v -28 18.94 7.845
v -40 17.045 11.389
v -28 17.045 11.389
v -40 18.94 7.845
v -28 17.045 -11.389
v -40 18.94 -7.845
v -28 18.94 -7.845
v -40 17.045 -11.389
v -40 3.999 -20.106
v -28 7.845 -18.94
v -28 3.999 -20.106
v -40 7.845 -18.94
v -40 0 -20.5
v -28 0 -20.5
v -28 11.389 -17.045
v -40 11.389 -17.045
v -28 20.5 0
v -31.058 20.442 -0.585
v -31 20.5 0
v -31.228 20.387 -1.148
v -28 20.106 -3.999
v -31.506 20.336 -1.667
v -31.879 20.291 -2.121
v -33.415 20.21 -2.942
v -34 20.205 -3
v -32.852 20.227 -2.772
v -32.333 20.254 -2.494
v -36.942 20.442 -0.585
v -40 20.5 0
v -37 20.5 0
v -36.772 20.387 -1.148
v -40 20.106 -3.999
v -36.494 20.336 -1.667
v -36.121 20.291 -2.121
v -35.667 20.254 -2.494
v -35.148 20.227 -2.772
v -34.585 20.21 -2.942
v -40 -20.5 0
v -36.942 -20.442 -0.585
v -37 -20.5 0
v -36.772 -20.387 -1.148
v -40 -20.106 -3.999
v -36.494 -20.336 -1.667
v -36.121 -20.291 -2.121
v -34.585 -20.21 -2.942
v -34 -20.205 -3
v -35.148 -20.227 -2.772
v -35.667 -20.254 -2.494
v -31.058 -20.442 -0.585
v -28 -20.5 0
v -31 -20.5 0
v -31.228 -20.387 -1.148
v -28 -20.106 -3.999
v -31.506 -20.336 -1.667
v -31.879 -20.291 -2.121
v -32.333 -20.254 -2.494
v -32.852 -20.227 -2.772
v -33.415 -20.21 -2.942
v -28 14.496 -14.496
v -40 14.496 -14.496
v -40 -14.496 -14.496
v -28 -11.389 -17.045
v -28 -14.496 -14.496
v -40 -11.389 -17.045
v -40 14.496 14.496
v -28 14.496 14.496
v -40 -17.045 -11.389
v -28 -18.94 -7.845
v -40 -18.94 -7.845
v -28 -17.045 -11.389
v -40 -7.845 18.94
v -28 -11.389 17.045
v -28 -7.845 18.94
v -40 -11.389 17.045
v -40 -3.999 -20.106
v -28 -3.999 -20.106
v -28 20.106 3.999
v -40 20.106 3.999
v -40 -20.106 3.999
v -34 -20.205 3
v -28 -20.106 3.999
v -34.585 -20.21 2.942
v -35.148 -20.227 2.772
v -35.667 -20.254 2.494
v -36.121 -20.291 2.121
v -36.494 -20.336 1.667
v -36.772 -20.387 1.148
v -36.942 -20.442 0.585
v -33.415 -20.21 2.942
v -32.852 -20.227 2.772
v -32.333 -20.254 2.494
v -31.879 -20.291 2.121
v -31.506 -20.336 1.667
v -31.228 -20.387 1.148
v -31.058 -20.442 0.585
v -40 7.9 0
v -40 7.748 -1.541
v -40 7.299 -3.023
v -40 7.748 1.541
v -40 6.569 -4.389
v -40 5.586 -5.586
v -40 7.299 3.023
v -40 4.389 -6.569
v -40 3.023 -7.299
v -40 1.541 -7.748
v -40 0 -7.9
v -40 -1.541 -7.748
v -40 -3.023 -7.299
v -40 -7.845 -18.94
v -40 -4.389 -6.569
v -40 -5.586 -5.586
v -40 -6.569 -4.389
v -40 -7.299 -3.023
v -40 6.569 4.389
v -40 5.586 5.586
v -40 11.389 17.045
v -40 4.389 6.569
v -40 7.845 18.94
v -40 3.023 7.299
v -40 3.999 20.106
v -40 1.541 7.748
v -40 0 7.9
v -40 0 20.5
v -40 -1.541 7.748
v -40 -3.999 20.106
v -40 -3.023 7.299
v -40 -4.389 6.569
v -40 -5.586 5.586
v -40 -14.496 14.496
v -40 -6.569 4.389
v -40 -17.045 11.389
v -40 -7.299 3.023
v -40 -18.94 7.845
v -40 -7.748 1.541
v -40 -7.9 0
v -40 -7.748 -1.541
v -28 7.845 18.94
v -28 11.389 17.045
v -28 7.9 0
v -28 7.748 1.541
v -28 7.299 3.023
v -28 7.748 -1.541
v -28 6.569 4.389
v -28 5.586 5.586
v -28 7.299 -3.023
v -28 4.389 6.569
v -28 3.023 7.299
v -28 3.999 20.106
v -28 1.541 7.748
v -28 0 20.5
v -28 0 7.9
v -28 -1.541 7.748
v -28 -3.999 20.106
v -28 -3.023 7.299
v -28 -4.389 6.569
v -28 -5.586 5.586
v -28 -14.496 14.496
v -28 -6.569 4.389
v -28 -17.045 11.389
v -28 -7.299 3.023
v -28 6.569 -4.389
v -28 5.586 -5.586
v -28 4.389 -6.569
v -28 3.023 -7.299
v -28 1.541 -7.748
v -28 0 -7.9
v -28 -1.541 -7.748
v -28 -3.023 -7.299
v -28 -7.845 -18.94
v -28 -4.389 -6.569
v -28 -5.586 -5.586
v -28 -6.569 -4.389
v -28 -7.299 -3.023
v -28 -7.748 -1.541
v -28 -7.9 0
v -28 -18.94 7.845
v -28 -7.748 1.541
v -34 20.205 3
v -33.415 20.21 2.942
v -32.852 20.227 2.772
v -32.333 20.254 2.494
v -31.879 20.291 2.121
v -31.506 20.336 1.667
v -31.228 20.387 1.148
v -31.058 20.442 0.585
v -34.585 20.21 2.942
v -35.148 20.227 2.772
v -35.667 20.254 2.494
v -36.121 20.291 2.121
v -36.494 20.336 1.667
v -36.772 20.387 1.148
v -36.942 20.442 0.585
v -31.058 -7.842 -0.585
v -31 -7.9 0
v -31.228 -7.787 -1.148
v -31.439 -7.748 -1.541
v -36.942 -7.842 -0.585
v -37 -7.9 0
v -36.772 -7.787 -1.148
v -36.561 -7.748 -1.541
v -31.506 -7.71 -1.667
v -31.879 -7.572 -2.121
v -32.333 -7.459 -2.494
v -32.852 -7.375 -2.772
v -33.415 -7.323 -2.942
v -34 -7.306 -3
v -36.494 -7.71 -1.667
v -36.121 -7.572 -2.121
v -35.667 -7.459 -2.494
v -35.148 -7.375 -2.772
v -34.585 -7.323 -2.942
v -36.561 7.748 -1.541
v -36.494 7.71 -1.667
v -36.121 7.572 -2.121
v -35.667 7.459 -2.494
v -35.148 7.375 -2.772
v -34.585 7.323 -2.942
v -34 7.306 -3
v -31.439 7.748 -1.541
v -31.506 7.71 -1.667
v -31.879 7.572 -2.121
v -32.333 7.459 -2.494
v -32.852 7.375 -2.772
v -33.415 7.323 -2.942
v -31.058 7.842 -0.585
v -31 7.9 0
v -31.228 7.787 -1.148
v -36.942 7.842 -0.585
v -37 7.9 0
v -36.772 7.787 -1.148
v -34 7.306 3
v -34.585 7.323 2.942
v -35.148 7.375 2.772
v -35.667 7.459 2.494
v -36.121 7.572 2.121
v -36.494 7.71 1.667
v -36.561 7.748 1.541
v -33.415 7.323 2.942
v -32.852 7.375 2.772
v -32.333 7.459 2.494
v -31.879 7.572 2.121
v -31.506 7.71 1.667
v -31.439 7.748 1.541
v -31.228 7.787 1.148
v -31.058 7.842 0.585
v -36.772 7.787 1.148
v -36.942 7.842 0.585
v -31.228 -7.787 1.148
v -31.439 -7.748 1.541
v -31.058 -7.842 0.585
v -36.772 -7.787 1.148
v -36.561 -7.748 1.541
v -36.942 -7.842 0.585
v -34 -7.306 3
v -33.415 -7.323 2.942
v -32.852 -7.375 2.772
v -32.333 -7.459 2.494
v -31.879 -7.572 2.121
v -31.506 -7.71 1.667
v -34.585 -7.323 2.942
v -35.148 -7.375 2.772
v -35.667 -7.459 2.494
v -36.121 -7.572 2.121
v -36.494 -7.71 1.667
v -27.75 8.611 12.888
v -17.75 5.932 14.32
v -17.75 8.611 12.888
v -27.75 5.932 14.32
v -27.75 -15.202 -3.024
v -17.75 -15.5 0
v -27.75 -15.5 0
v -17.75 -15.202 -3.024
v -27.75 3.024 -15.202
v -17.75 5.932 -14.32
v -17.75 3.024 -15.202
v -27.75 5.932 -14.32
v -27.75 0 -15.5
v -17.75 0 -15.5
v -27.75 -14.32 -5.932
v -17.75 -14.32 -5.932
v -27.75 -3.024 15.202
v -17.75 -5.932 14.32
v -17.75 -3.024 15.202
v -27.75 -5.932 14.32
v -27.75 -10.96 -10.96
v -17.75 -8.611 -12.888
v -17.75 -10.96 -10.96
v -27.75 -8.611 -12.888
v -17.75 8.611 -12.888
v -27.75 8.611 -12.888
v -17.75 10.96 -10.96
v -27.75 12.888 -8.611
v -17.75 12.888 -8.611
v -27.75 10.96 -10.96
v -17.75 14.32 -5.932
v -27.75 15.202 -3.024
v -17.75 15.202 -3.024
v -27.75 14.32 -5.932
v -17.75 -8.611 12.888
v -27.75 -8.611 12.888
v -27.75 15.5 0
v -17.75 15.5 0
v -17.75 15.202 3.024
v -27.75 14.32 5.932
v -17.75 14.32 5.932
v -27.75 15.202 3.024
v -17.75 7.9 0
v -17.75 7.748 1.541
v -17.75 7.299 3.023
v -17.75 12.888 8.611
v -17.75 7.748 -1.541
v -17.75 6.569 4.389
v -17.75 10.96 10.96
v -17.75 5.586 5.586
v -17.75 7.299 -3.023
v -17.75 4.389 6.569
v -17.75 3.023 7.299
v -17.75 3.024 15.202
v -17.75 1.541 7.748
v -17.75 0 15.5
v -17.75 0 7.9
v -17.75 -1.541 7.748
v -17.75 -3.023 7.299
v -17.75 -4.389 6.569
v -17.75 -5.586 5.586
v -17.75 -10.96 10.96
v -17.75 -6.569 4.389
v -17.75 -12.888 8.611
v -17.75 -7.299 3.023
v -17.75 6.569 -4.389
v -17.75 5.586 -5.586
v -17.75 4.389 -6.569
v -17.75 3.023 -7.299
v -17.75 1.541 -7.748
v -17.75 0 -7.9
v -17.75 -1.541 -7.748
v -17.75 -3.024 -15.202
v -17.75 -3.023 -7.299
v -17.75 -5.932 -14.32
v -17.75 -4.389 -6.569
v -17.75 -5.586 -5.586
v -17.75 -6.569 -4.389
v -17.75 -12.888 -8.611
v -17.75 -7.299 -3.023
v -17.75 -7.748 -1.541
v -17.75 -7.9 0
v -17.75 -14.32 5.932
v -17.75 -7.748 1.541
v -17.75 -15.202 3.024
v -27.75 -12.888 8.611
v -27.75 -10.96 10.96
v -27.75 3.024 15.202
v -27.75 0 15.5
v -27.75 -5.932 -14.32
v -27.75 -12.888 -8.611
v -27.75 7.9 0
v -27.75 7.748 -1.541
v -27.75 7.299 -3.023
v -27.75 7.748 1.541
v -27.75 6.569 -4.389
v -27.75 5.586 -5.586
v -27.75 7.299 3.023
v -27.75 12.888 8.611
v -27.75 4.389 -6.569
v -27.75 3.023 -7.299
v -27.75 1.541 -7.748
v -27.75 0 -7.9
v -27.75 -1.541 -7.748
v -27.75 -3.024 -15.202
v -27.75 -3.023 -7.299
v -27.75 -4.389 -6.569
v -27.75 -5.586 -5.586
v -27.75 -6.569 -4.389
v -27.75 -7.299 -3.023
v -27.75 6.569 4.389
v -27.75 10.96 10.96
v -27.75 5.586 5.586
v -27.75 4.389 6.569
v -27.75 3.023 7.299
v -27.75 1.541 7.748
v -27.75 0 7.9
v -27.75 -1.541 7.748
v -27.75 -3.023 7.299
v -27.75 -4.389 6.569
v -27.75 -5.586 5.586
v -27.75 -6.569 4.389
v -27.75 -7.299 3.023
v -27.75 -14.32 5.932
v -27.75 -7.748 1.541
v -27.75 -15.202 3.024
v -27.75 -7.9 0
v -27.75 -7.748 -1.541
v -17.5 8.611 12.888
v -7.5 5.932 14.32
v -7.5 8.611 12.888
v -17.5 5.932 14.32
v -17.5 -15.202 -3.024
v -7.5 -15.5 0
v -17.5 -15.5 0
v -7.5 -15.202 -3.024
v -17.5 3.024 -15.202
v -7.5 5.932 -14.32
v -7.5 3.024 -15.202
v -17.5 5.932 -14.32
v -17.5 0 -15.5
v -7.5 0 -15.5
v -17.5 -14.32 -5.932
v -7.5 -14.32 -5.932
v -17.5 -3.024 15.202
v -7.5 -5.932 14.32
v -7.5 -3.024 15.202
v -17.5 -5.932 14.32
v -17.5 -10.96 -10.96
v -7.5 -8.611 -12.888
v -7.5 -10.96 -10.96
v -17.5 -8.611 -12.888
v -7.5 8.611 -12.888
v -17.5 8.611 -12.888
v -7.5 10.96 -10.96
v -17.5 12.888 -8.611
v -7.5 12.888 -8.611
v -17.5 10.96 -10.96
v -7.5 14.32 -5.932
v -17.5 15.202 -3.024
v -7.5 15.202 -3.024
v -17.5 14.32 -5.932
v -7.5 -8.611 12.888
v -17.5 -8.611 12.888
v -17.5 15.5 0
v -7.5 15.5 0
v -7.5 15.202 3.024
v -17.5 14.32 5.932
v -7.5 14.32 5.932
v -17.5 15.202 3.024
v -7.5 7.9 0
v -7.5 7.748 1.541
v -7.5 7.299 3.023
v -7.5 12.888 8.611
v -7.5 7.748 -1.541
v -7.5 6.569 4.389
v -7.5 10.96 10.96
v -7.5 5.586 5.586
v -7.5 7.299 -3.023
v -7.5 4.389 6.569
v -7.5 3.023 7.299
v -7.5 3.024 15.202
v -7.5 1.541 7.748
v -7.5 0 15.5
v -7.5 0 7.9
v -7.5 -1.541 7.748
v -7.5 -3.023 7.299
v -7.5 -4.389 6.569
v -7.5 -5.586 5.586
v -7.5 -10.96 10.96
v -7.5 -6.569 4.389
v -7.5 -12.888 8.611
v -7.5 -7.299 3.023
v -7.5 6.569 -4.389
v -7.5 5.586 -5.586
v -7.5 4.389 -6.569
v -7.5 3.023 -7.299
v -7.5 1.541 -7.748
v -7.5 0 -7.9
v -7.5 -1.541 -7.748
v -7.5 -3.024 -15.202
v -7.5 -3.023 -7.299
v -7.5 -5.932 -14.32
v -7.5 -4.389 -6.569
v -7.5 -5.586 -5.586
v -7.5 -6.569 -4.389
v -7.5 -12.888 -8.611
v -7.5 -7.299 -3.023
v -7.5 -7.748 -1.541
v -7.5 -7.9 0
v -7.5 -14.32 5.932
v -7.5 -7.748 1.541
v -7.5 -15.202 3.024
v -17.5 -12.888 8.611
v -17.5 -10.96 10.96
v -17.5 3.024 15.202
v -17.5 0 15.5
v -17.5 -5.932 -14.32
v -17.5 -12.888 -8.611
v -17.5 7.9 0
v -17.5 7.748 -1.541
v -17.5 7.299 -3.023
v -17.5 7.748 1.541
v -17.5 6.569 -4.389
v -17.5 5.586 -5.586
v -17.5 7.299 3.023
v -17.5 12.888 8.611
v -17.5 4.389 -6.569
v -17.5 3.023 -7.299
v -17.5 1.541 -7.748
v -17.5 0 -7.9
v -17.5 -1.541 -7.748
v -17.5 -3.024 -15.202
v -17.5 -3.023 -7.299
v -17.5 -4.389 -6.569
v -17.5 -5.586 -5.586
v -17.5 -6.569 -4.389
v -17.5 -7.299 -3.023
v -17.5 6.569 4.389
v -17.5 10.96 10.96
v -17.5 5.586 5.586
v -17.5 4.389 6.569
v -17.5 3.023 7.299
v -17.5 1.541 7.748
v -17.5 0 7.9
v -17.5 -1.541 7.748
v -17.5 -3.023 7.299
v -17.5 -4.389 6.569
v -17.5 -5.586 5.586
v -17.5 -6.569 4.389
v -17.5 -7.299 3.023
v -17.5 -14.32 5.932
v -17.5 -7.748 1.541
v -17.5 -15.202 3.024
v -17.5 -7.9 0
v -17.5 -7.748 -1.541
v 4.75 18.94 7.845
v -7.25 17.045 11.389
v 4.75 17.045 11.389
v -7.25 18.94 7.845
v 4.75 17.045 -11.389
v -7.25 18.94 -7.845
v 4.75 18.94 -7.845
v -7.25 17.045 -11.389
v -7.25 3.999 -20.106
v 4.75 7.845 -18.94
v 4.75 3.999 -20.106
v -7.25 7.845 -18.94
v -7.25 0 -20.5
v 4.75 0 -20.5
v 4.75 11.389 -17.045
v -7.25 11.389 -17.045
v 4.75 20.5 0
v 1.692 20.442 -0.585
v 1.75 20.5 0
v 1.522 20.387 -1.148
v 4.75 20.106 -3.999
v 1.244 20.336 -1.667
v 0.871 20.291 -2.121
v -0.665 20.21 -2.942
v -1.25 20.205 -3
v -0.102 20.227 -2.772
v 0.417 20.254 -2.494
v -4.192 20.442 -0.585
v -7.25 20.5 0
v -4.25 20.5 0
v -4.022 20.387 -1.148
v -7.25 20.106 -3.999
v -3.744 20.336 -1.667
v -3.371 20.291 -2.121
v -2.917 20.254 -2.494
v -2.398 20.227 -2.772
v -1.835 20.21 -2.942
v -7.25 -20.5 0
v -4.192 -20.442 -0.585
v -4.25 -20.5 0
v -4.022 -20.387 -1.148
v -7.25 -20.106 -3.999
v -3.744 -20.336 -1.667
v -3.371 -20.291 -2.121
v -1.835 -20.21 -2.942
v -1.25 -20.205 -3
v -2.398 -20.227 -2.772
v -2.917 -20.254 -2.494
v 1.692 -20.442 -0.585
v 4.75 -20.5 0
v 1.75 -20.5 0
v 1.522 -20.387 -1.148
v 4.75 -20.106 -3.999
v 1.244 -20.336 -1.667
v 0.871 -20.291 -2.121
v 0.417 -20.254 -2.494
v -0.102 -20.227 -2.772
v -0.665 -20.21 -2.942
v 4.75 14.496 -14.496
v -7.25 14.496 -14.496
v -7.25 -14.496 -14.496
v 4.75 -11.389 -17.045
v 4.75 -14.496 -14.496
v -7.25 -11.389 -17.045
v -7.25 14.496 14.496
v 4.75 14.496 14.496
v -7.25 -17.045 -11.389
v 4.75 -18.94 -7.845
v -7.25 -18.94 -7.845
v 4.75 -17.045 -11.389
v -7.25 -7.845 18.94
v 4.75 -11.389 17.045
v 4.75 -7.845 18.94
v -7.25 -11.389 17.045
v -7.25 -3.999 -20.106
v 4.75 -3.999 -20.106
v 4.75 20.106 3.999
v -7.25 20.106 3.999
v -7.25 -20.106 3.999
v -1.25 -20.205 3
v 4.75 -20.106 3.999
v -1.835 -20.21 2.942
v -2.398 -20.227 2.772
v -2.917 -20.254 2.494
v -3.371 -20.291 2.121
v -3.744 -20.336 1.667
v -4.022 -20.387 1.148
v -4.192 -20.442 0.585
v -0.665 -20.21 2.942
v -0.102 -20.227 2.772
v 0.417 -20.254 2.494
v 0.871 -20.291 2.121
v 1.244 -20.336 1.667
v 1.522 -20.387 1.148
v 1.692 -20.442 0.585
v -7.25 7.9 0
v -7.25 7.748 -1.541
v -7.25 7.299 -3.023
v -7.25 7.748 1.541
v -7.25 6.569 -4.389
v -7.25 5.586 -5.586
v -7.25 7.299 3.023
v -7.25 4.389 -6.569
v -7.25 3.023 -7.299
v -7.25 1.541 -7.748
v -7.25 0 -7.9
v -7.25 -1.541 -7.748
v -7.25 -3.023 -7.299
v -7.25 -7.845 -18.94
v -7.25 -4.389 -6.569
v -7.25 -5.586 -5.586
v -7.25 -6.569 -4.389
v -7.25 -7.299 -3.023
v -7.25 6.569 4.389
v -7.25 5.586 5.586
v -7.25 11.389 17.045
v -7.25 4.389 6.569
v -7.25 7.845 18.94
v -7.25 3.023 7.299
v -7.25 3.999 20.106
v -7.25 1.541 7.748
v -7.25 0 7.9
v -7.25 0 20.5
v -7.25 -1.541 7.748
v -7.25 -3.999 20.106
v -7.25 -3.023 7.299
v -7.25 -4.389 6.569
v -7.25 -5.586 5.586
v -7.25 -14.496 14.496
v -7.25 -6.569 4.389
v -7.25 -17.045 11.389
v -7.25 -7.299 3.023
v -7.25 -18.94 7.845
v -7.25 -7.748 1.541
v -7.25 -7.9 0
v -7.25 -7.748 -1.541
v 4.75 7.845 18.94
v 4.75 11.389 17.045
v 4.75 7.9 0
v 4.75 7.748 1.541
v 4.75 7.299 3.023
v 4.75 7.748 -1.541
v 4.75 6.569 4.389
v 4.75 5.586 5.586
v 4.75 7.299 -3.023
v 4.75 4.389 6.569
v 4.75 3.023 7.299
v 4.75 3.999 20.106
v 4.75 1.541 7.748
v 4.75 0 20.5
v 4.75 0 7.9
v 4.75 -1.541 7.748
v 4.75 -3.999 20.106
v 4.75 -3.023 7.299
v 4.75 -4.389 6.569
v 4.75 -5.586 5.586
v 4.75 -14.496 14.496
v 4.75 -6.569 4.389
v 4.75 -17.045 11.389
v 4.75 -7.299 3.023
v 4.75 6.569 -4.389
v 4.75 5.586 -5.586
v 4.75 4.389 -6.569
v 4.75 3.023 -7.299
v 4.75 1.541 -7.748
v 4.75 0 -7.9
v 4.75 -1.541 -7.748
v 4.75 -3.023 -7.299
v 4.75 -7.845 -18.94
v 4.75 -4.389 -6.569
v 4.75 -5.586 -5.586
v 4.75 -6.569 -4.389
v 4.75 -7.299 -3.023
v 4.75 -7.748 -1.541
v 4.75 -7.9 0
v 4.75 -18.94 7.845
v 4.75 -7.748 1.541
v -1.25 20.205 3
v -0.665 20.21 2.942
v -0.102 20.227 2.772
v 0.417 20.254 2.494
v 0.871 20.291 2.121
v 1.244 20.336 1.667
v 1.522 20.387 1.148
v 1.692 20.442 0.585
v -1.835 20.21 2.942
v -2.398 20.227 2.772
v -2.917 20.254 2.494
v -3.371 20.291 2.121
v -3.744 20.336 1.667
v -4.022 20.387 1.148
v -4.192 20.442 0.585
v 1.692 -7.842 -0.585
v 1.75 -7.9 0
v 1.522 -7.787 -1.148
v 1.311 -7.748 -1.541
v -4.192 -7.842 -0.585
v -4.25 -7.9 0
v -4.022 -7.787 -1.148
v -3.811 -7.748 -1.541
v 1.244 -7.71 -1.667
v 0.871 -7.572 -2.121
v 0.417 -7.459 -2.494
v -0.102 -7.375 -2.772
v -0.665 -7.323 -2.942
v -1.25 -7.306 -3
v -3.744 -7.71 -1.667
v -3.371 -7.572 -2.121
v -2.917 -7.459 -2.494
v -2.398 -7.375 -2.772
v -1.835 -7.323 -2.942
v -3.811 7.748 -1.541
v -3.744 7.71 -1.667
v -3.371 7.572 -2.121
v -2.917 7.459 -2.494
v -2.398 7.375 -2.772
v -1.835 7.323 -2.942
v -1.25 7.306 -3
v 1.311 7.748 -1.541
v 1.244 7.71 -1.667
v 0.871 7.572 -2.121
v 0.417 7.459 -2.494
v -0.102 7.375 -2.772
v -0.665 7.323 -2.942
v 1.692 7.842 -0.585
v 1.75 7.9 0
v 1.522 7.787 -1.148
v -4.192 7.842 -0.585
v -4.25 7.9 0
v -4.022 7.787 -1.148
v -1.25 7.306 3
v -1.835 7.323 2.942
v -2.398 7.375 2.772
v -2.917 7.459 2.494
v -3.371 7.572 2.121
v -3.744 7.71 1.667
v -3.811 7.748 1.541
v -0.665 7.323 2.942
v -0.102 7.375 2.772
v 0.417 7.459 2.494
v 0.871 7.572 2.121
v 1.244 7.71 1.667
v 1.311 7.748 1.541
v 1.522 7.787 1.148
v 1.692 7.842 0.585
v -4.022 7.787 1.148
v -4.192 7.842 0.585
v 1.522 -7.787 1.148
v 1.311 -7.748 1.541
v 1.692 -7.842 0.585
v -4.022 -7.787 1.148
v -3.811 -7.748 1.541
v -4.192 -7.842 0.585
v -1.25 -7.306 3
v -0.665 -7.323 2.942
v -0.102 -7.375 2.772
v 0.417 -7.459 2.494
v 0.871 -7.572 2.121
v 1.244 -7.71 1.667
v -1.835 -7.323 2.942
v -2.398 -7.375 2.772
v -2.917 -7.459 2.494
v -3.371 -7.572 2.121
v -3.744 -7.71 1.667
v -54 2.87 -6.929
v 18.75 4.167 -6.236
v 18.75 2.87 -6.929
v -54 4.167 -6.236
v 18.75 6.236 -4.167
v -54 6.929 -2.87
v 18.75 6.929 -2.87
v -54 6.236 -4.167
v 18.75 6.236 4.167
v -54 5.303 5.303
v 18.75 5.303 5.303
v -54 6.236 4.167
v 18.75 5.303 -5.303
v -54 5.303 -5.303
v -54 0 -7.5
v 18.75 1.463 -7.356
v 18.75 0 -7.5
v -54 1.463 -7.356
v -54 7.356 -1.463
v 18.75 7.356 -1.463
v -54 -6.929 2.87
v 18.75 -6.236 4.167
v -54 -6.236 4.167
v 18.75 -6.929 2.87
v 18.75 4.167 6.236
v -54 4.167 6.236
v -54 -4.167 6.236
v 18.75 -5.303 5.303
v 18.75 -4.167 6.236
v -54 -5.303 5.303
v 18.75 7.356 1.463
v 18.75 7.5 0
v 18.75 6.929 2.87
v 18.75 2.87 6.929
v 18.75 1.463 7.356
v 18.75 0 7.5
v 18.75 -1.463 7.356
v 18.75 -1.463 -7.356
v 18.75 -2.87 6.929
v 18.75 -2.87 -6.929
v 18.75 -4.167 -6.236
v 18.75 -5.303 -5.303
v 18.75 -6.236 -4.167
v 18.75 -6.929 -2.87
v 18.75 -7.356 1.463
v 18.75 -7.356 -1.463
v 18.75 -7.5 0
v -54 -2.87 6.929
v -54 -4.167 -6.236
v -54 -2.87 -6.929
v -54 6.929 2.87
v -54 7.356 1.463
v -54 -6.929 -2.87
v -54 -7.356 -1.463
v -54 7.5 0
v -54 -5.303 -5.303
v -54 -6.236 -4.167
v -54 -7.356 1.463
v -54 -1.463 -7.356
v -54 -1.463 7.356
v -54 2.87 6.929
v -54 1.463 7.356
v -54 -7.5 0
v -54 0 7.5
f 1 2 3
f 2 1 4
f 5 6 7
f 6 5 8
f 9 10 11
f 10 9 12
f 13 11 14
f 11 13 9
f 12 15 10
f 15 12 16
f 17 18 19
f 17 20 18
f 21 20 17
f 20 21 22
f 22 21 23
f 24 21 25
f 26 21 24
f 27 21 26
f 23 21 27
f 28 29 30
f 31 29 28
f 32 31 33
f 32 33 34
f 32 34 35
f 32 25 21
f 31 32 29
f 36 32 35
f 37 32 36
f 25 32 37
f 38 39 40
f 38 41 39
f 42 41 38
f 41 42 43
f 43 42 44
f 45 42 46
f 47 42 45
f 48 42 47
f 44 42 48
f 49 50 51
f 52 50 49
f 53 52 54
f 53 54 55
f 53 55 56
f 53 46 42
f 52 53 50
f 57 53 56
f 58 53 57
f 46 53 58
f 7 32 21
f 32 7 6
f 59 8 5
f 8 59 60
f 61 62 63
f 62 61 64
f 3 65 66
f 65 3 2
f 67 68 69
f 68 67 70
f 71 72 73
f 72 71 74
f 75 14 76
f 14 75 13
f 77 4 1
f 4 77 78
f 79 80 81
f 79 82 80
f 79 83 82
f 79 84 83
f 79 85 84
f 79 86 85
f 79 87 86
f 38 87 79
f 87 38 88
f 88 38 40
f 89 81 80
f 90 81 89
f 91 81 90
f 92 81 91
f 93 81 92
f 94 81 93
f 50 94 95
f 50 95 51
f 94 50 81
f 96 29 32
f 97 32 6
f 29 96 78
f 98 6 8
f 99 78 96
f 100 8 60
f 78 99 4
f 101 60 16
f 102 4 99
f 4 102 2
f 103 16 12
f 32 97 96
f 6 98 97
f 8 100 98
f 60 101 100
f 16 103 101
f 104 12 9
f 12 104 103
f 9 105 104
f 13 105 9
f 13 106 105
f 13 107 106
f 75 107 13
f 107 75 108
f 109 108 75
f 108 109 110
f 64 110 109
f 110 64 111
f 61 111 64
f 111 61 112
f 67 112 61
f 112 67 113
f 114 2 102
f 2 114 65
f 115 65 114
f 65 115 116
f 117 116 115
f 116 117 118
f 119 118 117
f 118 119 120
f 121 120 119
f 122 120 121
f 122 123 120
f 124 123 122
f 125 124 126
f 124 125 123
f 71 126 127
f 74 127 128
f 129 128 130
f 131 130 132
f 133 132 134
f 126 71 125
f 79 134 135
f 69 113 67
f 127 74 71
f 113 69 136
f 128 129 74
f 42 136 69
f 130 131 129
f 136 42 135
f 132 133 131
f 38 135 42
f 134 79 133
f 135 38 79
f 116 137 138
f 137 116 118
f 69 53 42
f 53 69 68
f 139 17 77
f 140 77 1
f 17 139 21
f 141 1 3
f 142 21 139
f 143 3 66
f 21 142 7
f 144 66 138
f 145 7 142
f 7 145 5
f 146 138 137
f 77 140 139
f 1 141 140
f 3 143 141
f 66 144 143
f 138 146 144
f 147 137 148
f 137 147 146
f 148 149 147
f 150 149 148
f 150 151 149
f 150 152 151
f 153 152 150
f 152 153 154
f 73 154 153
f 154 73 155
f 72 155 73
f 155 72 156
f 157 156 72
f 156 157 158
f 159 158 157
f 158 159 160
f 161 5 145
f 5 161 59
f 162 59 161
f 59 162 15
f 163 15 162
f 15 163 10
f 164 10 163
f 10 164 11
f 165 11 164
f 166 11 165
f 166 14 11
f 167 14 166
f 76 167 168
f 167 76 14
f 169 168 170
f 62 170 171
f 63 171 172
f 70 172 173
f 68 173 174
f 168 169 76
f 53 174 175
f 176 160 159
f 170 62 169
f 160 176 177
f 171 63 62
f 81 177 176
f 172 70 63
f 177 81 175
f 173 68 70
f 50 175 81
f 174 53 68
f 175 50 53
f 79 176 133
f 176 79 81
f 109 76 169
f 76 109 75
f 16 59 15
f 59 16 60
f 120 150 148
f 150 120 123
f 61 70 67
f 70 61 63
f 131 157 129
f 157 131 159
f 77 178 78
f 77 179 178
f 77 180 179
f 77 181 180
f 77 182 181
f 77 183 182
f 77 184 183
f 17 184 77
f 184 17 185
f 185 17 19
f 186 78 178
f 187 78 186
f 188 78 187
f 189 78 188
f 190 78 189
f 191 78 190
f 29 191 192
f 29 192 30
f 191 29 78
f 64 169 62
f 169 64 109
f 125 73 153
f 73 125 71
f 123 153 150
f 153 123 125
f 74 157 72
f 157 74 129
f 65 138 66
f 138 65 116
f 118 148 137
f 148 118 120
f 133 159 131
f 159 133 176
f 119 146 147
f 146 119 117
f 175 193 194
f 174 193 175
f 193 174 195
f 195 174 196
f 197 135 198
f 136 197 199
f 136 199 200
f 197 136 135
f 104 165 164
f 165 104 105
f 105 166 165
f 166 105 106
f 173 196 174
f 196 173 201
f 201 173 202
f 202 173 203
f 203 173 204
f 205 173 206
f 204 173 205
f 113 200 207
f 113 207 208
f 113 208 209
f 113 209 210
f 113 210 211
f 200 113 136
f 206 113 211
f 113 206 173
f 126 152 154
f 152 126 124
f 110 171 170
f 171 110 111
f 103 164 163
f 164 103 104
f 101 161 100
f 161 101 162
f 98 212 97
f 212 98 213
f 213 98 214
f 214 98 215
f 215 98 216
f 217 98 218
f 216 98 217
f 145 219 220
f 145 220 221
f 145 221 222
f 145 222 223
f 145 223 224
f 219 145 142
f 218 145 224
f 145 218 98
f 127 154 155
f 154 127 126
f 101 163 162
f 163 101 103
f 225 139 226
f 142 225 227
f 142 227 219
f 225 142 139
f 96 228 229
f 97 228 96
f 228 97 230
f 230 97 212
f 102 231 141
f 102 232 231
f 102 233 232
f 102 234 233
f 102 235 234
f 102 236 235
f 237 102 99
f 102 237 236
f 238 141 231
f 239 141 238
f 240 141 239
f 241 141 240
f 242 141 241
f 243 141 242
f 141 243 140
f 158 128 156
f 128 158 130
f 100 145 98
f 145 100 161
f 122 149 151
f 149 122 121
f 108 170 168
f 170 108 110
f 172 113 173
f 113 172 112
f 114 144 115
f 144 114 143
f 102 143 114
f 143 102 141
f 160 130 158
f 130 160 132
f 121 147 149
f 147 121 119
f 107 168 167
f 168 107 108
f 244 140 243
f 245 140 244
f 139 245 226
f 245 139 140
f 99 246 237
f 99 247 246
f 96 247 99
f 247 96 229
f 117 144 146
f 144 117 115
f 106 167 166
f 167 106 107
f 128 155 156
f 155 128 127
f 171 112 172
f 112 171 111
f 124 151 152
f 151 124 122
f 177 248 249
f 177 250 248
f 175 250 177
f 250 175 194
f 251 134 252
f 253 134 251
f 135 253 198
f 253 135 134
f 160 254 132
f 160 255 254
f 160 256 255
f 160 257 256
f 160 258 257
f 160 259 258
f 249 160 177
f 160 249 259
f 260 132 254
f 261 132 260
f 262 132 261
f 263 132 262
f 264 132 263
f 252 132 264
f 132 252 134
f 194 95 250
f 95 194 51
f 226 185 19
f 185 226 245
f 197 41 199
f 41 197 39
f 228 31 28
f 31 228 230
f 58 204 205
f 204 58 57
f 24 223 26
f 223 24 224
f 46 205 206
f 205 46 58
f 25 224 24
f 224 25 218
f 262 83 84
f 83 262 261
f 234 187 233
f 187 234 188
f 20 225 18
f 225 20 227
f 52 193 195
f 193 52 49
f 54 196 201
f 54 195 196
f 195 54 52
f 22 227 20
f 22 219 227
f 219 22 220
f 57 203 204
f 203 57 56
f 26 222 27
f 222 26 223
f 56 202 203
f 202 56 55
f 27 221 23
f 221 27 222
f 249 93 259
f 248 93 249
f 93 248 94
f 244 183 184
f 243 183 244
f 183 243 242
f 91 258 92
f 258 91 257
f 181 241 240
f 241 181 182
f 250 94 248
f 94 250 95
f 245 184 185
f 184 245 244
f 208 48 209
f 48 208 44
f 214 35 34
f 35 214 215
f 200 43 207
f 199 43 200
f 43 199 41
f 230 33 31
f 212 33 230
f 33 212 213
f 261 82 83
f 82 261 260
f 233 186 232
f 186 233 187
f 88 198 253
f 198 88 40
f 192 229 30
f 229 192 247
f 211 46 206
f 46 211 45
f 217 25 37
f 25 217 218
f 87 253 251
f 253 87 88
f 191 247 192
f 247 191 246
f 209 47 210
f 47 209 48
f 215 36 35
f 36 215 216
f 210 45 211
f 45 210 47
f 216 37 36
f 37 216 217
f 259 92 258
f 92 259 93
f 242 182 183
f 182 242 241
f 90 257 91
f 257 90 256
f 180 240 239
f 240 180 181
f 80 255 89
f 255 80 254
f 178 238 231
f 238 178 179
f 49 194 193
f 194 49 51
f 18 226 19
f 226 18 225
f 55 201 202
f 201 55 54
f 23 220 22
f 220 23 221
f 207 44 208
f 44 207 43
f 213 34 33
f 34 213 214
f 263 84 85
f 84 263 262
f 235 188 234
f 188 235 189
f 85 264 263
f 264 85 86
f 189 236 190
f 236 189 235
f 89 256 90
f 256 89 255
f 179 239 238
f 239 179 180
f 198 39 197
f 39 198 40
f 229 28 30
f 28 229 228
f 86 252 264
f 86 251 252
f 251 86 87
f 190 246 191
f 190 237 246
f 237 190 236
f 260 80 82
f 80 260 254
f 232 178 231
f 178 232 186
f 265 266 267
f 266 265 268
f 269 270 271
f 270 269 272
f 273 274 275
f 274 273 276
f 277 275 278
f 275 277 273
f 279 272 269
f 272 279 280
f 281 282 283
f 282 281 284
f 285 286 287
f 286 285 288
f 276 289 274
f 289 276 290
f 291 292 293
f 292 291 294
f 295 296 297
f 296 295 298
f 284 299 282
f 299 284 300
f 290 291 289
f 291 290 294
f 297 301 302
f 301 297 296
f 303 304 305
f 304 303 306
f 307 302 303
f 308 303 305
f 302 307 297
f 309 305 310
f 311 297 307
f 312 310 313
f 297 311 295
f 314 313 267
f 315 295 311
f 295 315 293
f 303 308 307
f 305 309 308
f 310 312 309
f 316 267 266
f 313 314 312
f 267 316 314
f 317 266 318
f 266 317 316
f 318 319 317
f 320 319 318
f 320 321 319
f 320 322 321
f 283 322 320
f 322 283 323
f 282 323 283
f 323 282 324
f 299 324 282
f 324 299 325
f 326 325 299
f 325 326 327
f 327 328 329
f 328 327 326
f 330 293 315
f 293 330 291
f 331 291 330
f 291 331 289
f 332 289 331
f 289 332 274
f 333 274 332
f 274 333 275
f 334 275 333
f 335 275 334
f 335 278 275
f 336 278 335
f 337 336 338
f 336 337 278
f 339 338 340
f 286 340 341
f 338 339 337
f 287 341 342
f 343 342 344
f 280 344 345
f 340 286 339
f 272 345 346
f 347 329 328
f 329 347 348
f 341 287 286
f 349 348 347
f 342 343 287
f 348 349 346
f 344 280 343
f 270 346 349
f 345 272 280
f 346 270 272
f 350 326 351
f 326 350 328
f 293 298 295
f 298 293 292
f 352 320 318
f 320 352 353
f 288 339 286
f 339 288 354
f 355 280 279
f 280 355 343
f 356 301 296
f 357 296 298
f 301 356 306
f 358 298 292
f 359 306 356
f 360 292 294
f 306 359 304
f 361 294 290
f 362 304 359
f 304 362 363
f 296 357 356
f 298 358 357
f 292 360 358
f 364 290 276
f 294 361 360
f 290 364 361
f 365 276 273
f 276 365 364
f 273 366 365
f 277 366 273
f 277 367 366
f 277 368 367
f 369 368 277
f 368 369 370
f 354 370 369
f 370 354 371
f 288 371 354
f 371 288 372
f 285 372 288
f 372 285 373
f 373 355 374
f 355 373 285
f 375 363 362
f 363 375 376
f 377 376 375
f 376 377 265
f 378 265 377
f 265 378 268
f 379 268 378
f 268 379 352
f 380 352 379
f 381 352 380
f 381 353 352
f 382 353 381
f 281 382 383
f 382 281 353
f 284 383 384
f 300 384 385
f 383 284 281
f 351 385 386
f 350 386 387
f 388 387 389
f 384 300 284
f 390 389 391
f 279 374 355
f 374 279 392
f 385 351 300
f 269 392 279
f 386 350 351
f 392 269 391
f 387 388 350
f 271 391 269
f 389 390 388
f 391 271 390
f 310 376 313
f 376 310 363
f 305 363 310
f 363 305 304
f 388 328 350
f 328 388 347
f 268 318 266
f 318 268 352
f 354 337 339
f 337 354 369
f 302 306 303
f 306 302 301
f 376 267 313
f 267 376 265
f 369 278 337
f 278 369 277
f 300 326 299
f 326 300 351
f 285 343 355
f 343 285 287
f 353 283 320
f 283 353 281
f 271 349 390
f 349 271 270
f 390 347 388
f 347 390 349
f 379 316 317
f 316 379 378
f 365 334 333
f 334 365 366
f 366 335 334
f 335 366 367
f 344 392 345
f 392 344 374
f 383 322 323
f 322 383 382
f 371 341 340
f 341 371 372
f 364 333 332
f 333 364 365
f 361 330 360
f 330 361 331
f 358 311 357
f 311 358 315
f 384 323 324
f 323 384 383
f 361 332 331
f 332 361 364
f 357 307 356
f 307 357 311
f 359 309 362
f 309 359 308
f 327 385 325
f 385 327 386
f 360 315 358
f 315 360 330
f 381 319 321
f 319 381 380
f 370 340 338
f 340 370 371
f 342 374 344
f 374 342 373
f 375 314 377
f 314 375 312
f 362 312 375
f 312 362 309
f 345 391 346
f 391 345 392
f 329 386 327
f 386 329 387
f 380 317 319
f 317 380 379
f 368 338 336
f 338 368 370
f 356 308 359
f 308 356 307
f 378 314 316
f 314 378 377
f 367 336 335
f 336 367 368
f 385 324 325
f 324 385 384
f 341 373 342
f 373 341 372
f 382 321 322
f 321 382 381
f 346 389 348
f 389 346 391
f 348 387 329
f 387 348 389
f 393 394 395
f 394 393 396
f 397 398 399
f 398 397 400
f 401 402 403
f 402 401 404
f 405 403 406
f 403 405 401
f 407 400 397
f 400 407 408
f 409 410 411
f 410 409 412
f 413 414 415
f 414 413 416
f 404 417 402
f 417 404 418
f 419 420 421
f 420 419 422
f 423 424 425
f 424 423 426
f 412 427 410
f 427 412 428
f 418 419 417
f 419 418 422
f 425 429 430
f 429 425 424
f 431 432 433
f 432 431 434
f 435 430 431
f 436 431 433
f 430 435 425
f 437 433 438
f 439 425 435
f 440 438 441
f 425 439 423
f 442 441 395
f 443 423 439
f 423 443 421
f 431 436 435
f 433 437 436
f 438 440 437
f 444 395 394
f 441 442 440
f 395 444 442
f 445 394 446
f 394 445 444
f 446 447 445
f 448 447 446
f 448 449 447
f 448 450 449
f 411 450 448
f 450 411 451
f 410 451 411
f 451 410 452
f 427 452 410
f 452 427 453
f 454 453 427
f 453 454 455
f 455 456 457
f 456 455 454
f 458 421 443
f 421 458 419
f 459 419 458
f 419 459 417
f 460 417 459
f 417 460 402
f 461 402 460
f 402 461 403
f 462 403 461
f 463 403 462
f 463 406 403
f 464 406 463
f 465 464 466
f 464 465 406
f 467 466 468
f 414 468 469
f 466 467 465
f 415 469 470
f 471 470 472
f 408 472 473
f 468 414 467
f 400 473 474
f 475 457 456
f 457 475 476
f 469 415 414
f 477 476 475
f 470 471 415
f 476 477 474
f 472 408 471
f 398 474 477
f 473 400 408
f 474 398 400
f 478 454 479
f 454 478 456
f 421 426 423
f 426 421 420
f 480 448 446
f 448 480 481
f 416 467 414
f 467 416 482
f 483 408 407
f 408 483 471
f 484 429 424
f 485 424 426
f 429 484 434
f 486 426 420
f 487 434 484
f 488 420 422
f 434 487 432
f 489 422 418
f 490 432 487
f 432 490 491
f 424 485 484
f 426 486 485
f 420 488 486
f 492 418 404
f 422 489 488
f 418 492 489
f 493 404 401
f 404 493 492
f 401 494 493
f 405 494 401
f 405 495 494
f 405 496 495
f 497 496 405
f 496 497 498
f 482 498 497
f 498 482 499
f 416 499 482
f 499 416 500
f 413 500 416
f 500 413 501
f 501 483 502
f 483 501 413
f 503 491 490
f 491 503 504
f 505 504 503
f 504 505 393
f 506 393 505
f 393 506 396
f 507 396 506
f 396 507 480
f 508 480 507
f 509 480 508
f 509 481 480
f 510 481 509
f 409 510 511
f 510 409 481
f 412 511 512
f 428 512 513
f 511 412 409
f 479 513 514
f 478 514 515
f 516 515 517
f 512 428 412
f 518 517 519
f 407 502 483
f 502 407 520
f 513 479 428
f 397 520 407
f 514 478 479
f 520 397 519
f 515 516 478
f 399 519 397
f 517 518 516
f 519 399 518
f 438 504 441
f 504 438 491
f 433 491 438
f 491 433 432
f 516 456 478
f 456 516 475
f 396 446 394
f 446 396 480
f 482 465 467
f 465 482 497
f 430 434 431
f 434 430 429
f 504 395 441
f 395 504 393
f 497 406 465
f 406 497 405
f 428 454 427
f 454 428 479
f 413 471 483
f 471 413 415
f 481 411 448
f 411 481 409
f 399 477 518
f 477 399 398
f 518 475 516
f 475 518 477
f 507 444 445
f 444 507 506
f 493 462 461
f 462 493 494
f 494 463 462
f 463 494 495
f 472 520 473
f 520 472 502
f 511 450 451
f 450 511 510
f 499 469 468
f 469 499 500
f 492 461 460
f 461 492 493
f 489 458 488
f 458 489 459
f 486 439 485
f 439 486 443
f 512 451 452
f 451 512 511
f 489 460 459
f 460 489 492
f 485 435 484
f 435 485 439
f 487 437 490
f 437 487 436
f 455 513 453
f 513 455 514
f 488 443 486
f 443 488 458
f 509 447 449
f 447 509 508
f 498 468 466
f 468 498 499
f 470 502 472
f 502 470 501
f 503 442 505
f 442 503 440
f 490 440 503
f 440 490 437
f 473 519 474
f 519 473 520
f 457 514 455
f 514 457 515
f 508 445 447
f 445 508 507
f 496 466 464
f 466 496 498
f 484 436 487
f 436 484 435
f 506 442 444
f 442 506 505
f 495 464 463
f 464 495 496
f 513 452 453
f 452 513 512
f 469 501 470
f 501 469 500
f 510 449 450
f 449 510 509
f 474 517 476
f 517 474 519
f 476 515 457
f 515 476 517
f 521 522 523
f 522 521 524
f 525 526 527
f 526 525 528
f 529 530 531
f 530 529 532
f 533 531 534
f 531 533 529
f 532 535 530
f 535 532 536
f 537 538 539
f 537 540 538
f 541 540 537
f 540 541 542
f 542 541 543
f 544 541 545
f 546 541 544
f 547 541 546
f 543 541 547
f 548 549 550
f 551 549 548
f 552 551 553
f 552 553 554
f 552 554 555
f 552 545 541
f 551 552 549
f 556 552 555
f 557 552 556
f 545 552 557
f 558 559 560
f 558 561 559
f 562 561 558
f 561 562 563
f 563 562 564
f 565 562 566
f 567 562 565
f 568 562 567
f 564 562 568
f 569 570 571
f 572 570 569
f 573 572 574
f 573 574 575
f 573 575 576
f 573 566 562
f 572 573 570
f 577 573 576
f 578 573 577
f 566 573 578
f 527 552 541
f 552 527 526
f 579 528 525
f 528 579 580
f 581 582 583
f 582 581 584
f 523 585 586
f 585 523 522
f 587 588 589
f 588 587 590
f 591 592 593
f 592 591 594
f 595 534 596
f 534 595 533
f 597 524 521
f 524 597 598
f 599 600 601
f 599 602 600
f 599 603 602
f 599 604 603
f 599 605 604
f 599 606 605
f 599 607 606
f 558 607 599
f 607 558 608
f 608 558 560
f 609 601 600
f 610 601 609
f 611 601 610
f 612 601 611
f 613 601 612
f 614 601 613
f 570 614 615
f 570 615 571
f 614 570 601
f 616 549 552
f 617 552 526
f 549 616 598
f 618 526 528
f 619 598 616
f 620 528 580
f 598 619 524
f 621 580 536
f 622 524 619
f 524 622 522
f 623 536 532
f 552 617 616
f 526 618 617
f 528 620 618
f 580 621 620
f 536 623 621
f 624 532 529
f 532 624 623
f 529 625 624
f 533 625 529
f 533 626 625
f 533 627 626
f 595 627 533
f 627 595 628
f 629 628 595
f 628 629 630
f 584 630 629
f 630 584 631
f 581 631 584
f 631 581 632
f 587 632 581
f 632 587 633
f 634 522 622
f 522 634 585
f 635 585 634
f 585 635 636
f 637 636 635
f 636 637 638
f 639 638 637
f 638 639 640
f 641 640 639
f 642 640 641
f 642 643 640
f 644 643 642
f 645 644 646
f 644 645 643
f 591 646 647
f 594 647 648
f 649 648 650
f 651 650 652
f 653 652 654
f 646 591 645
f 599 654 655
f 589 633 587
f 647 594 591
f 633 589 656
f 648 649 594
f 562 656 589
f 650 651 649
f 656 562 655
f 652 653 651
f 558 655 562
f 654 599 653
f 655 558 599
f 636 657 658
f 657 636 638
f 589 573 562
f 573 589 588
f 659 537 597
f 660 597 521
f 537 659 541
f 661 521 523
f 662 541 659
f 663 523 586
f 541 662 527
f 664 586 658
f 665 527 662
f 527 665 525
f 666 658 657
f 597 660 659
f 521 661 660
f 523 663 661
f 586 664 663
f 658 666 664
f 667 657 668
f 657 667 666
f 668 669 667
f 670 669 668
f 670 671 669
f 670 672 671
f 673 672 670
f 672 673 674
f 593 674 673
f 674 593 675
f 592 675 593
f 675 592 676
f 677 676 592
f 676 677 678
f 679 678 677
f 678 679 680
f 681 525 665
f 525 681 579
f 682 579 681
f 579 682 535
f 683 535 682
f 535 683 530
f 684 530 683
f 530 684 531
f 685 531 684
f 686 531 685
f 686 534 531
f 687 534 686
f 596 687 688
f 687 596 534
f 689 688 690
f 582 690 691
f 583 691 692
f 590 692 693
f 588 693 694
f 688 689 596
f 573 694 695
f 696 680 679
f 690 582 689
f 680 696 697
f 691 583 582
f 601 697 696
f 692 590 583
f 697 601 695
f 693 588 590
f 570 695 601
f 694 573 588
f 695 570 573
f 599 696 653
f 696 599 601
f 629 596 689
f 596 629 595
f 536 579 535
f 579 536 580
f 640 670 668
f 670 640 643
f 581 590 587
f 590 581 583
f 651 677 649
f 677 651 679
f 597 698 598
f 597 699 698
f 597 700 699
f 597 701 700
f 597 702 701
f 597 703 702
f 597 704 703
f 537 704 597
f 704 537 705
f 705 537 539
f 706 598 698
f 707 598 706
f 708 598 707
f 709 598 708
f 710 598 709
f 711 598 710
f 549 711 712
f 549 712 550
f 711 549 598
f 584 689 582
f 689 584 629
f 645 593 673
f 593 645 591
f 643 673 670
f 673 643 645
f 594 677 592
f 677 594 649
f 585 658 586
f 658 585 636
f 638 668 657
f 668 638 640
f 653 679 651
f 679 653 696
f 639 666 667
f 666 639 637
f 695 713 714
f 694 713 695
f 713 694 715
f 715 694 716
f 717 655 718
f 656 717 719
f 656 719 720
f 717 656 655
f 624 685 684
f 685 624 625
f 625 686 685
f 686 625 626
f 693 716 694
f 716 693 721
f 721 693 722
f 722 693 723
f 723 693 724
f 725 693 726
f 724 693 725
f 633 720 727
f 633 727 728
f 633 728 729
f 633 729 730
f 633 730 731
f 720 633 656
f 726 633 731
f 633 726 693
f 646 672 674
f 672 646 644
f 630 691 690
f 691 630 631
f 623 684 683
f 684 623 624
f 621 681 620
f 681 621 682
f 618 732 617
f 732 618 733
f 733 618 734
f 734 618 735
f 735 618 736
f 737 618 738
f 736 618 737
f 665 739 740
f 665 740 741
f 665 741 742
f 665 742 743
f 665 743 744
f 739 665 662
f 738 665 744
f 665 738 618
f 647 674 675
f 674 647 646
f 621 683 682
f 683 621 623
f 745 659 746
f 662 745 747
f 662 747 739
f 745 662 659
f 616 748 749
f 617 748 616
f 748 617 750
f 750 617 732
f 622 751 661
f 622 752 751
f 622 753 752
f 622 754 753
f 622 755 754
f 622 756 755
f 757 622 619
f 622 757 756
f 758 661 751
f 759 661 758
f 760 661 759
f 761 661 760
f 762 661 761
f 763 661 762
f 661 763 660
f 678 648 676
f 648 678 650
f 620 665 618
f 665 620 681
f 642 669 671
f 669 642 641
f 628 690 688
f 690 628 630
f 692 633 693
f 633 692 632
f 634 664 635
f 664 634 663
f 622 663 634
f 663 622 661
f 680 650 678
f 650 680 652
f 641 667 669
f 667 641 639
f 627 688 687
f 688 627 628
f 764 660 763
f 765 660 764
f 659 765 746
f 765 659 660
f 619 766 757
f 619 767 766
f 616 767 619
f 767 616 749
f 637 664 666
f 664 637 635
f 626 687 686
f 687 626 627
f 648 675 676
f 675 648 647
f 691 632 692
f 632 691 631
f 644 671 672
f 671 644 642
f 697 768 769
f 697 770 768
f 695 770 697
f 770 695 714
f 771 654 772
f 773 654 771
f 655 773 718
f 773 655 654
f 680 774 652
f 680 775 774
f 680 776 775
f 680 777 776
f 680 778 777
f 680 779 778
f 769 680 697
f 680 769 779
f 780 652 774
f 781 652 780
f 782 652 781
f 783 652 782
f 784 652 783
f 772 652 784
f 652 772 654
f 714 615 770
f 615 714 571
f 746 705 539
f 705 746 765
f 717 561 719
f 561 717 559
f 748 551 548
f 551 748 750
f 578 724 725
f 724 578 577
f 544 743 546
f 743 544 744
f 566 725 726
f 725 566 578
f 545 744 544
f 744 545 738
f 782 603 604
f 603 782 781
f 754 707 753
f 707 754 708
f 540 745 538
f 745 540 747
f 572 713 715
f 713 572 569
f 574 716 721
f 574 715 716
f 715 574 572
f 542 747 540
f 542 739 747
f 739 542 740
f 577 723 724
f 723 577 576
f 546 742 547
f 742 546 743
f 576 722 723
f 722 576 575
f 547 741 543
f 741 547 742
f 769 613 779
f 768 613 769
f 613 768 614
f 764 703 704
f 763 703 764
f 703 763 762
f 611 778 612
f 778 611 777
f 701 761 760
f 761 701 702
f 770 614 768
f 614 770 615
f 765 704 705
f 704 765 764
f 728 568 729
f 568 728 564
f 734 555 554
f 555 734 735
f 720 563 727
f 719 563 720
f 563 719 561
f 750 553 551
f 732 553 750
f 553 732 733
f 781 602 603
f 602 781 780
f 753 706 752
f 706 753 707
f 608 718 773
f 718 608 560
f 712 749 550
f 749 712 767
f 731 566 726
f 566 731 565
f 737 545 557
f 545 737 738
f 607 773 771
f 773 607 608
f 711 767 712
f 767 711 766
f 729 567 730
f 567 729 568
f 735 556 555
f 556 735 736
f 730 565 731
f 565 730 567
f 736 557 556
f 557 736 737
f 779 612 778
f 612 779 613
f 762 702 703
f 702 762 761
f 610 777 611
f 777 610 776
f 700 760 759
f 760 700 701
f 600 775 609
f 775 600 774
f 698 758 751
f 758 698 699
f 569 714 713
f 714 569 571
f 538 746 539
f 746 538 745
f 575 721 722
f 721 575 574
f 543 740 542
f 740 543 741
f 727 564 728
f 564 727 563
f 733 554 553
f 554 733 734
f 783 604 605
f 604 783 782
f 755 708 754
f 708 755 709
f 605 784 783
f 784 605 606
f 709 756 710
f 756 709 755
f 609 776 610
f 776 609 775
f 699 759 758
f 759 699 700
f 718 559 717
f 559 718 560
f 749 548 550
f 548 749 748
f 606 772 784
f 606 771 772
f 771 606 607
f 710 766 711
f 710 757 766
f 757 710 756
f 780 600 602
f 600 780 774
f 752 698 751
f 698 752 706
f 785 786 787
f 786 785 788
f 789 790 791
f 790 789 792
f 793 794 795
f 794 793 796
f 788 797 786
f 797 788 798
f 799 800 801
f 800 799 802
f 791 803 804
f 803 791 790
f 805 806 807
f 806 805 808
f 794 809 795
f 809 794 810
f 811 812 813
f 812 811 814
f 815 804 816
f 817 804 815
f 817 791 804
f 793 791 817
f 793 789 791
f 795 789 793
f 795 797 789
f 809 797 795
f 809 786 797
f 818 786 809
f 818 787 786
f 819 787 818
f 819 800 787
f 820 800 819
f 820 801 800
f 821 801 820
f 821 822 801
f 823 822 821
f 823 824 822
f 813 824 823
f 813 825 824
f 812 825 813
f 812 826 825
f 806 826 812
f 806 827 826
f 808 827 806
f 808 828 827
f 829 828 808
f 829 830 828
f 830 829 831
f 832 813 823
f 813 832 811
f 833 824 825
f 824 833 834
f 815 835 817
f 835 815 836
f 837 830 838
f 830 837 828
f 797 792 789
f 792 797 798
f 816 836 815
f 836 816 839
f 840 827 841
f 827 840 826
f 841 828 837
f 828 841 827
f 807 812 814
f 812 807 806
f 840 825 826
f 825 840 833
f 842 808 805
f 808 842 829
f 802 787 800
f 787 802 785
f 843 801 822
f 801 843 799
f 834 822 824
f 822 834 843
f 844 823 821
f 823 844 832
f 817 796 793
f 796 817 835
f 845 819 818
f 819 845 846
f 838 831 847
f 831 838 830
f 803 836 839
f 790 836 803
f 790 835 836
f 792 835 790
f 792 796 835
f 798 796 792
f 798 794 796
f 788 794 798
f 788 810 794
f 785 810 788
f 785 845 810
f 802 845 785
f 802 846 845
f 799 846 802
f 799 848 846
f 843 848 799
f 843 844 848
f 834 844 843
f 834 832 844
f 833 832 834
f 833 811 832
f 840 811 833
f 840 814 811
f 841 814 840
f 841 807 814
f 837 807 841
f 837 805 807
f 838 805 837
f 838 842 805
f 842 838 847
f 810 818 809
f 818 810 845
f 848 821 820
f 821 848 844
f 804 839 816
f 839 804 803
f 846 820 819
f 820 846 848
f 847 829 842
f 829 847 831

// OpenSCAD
$fn = 32;

// ------------------------------------------------------------------------
// Shaft with rings and collars: d15 shaft, 4 rings
// Every part is its own module, assembly() places them once.
// ------------------------------------------------------------------------

// --- part 1 ---
module shaft() {
  translate([0, 0, -36.375]) cylinder(h = 72.75, d = 15);
}

// --- part 2 ---
module collar_a() {
  difference() {
    cylinder(h = 12, d = 41);
    translate([0, 0, -1]) cylinder(h = 14, d = 15.8);
    translate([0, 0, 6]) rotate([90, 0, 0]) cylinder(h = 43, d = 6, center = true);
  }
}

// --- part 3 ---
module spacer_a() {
  difference() {
      translate([0, 0, 0]) cylinder(h = 10, d = 31);
      translate([0, 0, -1]) cylinder(h = 12, d = 15.8);
    }
}

// --- part 4 ---
module spacer_b() {
  difference() {
      translate([0, 0, 0]) cylinder(h = 10, d = 31);
      translate([0, 0, -1]) cylinder(h = 12, d = 15.8);
    }
}

// --- part 5 ---
module collar_b() {
  difference() {
    cylinder(h = 12, d = 41);
    translate([0, 0, -1]) cylinder(h = 14, d = 15.8);
    translate([0, 0, 6]) rotate([90, 0, 0]) cylinder(h = 43, d = 6, center = true);
  }
}

// --- assembly ---
module assembly() {
  translate([-17.625, 0, 0]) rotate([0, 90, 0]) shaft();
  translate([-40, 0, 0]) rotate([0, 90, 0]) collar_a();
  translate([-27.75, 0, 0]) rotate([0, 90, 0]) spacer_a();
  translate([-17.5, 0, 0]) rotate([0, 90, 0]) spacer_b();
  translate([-7.25, 0, 0]) rotate([0, 90, 0]) collar_b();
}

assembly();
